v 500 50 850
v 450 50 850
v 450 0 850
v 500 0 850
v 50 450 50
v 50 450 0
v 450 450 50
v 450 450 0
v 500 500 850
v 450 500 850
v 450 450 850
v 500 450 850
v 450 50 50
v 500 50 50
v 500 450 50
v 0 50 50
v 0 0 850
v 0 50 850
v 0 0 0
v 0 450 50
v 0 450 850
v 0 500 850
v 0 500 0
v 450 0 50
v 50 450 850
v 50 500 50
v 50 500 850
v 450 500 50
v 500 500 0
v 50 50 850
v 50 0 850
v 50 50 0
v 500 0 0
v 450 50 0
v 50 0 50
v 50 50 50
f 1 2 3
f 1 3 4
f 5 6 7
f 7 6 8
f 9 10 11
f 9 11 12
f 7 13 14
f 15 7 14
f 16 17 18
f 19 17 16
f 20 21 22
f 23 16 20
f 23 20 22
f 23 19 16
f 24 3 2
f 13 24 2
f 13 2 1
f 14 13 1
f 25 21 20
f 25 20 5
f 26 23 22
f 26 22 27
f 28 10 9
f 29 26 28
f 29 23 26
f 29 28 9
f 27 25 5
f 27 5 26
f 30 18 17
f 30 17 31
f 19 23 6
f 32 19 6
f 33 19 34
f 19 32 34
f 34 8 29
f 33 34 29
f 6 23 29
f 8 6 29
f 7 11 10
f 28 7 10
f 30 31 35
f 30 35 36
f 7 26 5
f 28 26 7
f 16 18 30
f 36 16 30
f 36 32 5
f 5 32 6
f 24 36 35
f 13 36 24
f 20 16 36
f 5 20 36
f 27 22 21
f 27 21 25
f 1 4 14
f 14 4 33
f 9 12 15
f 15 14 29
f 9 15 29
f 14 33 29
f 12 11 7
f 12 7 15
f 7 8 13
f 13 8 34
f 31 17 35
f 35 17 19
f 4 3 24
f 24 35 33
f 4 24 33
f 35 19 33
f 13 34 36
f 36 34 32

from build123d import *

# Parameters (mm, degrees)
F0_W     = 50
F0_H     = 50
F0_W_2   = 400
F0_H_2   = 400
F1_DEPTH = 50
F2_W     = 50
F2_H     = 50
F3_DEPTH = 800


with BuildPart() as f1:
    # F0 (on Top) → F1 (new body)
    with BuildSketch(Plane.XY):
        with Locations((25, 475)):
            Rectangle(F0_W, F0_H)
        with Locations((250, 475)):
            Rectangle(F0_W_2, F0_H)
        with Locations((475, 475)):
            Rectangle(F0_W, F0_H)
        with Locations((475, 250)):
            Rectangle(F0_W, F0_H_2)
        with Locations((475, 25)):
            Rectangle(F0_W, F0_H)
        with Locations((250, 25)):
            Rectangle(F0_W_2, F0_H)
        with Locations((25, 25)):
            Rectangle(F0_W, F0_H)
        with Locations((25, 250)):
            Rectangle(F0_W, F0_H_2)
    extrude(amount=F1_DEPTH)

    # F2 (on face) → F3 (join)
    with BuildSketch(Plane.XY.offset(50)):
        with Locations((25, 475)):
            Rectangle(F2_W, F2_H)
        with Locations((475, 475)):
            Rectangle(F2_W, F2_H)
        with Locations((475, 25)):
            Rectangle(F2_W, F2_H)
        with Locations((25, 25)):
            Rectangle(F2_W, F2_H)
    extrude(amount=F3_DEPTH)


solid = f1.part
